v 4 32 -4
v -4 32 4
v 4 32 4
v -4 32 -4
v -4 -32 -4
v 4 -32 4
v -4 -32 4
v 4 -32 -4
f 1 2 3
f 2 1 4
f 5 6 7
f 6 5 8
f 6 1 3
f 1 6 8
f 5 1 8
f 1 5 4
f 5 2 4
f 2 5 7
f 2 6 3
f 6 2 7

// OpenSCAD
size=32; //block=32 //item=8

rotate([0,90,90]){
cube([size*0.25,size*0.25,size*2],center=true);
};
